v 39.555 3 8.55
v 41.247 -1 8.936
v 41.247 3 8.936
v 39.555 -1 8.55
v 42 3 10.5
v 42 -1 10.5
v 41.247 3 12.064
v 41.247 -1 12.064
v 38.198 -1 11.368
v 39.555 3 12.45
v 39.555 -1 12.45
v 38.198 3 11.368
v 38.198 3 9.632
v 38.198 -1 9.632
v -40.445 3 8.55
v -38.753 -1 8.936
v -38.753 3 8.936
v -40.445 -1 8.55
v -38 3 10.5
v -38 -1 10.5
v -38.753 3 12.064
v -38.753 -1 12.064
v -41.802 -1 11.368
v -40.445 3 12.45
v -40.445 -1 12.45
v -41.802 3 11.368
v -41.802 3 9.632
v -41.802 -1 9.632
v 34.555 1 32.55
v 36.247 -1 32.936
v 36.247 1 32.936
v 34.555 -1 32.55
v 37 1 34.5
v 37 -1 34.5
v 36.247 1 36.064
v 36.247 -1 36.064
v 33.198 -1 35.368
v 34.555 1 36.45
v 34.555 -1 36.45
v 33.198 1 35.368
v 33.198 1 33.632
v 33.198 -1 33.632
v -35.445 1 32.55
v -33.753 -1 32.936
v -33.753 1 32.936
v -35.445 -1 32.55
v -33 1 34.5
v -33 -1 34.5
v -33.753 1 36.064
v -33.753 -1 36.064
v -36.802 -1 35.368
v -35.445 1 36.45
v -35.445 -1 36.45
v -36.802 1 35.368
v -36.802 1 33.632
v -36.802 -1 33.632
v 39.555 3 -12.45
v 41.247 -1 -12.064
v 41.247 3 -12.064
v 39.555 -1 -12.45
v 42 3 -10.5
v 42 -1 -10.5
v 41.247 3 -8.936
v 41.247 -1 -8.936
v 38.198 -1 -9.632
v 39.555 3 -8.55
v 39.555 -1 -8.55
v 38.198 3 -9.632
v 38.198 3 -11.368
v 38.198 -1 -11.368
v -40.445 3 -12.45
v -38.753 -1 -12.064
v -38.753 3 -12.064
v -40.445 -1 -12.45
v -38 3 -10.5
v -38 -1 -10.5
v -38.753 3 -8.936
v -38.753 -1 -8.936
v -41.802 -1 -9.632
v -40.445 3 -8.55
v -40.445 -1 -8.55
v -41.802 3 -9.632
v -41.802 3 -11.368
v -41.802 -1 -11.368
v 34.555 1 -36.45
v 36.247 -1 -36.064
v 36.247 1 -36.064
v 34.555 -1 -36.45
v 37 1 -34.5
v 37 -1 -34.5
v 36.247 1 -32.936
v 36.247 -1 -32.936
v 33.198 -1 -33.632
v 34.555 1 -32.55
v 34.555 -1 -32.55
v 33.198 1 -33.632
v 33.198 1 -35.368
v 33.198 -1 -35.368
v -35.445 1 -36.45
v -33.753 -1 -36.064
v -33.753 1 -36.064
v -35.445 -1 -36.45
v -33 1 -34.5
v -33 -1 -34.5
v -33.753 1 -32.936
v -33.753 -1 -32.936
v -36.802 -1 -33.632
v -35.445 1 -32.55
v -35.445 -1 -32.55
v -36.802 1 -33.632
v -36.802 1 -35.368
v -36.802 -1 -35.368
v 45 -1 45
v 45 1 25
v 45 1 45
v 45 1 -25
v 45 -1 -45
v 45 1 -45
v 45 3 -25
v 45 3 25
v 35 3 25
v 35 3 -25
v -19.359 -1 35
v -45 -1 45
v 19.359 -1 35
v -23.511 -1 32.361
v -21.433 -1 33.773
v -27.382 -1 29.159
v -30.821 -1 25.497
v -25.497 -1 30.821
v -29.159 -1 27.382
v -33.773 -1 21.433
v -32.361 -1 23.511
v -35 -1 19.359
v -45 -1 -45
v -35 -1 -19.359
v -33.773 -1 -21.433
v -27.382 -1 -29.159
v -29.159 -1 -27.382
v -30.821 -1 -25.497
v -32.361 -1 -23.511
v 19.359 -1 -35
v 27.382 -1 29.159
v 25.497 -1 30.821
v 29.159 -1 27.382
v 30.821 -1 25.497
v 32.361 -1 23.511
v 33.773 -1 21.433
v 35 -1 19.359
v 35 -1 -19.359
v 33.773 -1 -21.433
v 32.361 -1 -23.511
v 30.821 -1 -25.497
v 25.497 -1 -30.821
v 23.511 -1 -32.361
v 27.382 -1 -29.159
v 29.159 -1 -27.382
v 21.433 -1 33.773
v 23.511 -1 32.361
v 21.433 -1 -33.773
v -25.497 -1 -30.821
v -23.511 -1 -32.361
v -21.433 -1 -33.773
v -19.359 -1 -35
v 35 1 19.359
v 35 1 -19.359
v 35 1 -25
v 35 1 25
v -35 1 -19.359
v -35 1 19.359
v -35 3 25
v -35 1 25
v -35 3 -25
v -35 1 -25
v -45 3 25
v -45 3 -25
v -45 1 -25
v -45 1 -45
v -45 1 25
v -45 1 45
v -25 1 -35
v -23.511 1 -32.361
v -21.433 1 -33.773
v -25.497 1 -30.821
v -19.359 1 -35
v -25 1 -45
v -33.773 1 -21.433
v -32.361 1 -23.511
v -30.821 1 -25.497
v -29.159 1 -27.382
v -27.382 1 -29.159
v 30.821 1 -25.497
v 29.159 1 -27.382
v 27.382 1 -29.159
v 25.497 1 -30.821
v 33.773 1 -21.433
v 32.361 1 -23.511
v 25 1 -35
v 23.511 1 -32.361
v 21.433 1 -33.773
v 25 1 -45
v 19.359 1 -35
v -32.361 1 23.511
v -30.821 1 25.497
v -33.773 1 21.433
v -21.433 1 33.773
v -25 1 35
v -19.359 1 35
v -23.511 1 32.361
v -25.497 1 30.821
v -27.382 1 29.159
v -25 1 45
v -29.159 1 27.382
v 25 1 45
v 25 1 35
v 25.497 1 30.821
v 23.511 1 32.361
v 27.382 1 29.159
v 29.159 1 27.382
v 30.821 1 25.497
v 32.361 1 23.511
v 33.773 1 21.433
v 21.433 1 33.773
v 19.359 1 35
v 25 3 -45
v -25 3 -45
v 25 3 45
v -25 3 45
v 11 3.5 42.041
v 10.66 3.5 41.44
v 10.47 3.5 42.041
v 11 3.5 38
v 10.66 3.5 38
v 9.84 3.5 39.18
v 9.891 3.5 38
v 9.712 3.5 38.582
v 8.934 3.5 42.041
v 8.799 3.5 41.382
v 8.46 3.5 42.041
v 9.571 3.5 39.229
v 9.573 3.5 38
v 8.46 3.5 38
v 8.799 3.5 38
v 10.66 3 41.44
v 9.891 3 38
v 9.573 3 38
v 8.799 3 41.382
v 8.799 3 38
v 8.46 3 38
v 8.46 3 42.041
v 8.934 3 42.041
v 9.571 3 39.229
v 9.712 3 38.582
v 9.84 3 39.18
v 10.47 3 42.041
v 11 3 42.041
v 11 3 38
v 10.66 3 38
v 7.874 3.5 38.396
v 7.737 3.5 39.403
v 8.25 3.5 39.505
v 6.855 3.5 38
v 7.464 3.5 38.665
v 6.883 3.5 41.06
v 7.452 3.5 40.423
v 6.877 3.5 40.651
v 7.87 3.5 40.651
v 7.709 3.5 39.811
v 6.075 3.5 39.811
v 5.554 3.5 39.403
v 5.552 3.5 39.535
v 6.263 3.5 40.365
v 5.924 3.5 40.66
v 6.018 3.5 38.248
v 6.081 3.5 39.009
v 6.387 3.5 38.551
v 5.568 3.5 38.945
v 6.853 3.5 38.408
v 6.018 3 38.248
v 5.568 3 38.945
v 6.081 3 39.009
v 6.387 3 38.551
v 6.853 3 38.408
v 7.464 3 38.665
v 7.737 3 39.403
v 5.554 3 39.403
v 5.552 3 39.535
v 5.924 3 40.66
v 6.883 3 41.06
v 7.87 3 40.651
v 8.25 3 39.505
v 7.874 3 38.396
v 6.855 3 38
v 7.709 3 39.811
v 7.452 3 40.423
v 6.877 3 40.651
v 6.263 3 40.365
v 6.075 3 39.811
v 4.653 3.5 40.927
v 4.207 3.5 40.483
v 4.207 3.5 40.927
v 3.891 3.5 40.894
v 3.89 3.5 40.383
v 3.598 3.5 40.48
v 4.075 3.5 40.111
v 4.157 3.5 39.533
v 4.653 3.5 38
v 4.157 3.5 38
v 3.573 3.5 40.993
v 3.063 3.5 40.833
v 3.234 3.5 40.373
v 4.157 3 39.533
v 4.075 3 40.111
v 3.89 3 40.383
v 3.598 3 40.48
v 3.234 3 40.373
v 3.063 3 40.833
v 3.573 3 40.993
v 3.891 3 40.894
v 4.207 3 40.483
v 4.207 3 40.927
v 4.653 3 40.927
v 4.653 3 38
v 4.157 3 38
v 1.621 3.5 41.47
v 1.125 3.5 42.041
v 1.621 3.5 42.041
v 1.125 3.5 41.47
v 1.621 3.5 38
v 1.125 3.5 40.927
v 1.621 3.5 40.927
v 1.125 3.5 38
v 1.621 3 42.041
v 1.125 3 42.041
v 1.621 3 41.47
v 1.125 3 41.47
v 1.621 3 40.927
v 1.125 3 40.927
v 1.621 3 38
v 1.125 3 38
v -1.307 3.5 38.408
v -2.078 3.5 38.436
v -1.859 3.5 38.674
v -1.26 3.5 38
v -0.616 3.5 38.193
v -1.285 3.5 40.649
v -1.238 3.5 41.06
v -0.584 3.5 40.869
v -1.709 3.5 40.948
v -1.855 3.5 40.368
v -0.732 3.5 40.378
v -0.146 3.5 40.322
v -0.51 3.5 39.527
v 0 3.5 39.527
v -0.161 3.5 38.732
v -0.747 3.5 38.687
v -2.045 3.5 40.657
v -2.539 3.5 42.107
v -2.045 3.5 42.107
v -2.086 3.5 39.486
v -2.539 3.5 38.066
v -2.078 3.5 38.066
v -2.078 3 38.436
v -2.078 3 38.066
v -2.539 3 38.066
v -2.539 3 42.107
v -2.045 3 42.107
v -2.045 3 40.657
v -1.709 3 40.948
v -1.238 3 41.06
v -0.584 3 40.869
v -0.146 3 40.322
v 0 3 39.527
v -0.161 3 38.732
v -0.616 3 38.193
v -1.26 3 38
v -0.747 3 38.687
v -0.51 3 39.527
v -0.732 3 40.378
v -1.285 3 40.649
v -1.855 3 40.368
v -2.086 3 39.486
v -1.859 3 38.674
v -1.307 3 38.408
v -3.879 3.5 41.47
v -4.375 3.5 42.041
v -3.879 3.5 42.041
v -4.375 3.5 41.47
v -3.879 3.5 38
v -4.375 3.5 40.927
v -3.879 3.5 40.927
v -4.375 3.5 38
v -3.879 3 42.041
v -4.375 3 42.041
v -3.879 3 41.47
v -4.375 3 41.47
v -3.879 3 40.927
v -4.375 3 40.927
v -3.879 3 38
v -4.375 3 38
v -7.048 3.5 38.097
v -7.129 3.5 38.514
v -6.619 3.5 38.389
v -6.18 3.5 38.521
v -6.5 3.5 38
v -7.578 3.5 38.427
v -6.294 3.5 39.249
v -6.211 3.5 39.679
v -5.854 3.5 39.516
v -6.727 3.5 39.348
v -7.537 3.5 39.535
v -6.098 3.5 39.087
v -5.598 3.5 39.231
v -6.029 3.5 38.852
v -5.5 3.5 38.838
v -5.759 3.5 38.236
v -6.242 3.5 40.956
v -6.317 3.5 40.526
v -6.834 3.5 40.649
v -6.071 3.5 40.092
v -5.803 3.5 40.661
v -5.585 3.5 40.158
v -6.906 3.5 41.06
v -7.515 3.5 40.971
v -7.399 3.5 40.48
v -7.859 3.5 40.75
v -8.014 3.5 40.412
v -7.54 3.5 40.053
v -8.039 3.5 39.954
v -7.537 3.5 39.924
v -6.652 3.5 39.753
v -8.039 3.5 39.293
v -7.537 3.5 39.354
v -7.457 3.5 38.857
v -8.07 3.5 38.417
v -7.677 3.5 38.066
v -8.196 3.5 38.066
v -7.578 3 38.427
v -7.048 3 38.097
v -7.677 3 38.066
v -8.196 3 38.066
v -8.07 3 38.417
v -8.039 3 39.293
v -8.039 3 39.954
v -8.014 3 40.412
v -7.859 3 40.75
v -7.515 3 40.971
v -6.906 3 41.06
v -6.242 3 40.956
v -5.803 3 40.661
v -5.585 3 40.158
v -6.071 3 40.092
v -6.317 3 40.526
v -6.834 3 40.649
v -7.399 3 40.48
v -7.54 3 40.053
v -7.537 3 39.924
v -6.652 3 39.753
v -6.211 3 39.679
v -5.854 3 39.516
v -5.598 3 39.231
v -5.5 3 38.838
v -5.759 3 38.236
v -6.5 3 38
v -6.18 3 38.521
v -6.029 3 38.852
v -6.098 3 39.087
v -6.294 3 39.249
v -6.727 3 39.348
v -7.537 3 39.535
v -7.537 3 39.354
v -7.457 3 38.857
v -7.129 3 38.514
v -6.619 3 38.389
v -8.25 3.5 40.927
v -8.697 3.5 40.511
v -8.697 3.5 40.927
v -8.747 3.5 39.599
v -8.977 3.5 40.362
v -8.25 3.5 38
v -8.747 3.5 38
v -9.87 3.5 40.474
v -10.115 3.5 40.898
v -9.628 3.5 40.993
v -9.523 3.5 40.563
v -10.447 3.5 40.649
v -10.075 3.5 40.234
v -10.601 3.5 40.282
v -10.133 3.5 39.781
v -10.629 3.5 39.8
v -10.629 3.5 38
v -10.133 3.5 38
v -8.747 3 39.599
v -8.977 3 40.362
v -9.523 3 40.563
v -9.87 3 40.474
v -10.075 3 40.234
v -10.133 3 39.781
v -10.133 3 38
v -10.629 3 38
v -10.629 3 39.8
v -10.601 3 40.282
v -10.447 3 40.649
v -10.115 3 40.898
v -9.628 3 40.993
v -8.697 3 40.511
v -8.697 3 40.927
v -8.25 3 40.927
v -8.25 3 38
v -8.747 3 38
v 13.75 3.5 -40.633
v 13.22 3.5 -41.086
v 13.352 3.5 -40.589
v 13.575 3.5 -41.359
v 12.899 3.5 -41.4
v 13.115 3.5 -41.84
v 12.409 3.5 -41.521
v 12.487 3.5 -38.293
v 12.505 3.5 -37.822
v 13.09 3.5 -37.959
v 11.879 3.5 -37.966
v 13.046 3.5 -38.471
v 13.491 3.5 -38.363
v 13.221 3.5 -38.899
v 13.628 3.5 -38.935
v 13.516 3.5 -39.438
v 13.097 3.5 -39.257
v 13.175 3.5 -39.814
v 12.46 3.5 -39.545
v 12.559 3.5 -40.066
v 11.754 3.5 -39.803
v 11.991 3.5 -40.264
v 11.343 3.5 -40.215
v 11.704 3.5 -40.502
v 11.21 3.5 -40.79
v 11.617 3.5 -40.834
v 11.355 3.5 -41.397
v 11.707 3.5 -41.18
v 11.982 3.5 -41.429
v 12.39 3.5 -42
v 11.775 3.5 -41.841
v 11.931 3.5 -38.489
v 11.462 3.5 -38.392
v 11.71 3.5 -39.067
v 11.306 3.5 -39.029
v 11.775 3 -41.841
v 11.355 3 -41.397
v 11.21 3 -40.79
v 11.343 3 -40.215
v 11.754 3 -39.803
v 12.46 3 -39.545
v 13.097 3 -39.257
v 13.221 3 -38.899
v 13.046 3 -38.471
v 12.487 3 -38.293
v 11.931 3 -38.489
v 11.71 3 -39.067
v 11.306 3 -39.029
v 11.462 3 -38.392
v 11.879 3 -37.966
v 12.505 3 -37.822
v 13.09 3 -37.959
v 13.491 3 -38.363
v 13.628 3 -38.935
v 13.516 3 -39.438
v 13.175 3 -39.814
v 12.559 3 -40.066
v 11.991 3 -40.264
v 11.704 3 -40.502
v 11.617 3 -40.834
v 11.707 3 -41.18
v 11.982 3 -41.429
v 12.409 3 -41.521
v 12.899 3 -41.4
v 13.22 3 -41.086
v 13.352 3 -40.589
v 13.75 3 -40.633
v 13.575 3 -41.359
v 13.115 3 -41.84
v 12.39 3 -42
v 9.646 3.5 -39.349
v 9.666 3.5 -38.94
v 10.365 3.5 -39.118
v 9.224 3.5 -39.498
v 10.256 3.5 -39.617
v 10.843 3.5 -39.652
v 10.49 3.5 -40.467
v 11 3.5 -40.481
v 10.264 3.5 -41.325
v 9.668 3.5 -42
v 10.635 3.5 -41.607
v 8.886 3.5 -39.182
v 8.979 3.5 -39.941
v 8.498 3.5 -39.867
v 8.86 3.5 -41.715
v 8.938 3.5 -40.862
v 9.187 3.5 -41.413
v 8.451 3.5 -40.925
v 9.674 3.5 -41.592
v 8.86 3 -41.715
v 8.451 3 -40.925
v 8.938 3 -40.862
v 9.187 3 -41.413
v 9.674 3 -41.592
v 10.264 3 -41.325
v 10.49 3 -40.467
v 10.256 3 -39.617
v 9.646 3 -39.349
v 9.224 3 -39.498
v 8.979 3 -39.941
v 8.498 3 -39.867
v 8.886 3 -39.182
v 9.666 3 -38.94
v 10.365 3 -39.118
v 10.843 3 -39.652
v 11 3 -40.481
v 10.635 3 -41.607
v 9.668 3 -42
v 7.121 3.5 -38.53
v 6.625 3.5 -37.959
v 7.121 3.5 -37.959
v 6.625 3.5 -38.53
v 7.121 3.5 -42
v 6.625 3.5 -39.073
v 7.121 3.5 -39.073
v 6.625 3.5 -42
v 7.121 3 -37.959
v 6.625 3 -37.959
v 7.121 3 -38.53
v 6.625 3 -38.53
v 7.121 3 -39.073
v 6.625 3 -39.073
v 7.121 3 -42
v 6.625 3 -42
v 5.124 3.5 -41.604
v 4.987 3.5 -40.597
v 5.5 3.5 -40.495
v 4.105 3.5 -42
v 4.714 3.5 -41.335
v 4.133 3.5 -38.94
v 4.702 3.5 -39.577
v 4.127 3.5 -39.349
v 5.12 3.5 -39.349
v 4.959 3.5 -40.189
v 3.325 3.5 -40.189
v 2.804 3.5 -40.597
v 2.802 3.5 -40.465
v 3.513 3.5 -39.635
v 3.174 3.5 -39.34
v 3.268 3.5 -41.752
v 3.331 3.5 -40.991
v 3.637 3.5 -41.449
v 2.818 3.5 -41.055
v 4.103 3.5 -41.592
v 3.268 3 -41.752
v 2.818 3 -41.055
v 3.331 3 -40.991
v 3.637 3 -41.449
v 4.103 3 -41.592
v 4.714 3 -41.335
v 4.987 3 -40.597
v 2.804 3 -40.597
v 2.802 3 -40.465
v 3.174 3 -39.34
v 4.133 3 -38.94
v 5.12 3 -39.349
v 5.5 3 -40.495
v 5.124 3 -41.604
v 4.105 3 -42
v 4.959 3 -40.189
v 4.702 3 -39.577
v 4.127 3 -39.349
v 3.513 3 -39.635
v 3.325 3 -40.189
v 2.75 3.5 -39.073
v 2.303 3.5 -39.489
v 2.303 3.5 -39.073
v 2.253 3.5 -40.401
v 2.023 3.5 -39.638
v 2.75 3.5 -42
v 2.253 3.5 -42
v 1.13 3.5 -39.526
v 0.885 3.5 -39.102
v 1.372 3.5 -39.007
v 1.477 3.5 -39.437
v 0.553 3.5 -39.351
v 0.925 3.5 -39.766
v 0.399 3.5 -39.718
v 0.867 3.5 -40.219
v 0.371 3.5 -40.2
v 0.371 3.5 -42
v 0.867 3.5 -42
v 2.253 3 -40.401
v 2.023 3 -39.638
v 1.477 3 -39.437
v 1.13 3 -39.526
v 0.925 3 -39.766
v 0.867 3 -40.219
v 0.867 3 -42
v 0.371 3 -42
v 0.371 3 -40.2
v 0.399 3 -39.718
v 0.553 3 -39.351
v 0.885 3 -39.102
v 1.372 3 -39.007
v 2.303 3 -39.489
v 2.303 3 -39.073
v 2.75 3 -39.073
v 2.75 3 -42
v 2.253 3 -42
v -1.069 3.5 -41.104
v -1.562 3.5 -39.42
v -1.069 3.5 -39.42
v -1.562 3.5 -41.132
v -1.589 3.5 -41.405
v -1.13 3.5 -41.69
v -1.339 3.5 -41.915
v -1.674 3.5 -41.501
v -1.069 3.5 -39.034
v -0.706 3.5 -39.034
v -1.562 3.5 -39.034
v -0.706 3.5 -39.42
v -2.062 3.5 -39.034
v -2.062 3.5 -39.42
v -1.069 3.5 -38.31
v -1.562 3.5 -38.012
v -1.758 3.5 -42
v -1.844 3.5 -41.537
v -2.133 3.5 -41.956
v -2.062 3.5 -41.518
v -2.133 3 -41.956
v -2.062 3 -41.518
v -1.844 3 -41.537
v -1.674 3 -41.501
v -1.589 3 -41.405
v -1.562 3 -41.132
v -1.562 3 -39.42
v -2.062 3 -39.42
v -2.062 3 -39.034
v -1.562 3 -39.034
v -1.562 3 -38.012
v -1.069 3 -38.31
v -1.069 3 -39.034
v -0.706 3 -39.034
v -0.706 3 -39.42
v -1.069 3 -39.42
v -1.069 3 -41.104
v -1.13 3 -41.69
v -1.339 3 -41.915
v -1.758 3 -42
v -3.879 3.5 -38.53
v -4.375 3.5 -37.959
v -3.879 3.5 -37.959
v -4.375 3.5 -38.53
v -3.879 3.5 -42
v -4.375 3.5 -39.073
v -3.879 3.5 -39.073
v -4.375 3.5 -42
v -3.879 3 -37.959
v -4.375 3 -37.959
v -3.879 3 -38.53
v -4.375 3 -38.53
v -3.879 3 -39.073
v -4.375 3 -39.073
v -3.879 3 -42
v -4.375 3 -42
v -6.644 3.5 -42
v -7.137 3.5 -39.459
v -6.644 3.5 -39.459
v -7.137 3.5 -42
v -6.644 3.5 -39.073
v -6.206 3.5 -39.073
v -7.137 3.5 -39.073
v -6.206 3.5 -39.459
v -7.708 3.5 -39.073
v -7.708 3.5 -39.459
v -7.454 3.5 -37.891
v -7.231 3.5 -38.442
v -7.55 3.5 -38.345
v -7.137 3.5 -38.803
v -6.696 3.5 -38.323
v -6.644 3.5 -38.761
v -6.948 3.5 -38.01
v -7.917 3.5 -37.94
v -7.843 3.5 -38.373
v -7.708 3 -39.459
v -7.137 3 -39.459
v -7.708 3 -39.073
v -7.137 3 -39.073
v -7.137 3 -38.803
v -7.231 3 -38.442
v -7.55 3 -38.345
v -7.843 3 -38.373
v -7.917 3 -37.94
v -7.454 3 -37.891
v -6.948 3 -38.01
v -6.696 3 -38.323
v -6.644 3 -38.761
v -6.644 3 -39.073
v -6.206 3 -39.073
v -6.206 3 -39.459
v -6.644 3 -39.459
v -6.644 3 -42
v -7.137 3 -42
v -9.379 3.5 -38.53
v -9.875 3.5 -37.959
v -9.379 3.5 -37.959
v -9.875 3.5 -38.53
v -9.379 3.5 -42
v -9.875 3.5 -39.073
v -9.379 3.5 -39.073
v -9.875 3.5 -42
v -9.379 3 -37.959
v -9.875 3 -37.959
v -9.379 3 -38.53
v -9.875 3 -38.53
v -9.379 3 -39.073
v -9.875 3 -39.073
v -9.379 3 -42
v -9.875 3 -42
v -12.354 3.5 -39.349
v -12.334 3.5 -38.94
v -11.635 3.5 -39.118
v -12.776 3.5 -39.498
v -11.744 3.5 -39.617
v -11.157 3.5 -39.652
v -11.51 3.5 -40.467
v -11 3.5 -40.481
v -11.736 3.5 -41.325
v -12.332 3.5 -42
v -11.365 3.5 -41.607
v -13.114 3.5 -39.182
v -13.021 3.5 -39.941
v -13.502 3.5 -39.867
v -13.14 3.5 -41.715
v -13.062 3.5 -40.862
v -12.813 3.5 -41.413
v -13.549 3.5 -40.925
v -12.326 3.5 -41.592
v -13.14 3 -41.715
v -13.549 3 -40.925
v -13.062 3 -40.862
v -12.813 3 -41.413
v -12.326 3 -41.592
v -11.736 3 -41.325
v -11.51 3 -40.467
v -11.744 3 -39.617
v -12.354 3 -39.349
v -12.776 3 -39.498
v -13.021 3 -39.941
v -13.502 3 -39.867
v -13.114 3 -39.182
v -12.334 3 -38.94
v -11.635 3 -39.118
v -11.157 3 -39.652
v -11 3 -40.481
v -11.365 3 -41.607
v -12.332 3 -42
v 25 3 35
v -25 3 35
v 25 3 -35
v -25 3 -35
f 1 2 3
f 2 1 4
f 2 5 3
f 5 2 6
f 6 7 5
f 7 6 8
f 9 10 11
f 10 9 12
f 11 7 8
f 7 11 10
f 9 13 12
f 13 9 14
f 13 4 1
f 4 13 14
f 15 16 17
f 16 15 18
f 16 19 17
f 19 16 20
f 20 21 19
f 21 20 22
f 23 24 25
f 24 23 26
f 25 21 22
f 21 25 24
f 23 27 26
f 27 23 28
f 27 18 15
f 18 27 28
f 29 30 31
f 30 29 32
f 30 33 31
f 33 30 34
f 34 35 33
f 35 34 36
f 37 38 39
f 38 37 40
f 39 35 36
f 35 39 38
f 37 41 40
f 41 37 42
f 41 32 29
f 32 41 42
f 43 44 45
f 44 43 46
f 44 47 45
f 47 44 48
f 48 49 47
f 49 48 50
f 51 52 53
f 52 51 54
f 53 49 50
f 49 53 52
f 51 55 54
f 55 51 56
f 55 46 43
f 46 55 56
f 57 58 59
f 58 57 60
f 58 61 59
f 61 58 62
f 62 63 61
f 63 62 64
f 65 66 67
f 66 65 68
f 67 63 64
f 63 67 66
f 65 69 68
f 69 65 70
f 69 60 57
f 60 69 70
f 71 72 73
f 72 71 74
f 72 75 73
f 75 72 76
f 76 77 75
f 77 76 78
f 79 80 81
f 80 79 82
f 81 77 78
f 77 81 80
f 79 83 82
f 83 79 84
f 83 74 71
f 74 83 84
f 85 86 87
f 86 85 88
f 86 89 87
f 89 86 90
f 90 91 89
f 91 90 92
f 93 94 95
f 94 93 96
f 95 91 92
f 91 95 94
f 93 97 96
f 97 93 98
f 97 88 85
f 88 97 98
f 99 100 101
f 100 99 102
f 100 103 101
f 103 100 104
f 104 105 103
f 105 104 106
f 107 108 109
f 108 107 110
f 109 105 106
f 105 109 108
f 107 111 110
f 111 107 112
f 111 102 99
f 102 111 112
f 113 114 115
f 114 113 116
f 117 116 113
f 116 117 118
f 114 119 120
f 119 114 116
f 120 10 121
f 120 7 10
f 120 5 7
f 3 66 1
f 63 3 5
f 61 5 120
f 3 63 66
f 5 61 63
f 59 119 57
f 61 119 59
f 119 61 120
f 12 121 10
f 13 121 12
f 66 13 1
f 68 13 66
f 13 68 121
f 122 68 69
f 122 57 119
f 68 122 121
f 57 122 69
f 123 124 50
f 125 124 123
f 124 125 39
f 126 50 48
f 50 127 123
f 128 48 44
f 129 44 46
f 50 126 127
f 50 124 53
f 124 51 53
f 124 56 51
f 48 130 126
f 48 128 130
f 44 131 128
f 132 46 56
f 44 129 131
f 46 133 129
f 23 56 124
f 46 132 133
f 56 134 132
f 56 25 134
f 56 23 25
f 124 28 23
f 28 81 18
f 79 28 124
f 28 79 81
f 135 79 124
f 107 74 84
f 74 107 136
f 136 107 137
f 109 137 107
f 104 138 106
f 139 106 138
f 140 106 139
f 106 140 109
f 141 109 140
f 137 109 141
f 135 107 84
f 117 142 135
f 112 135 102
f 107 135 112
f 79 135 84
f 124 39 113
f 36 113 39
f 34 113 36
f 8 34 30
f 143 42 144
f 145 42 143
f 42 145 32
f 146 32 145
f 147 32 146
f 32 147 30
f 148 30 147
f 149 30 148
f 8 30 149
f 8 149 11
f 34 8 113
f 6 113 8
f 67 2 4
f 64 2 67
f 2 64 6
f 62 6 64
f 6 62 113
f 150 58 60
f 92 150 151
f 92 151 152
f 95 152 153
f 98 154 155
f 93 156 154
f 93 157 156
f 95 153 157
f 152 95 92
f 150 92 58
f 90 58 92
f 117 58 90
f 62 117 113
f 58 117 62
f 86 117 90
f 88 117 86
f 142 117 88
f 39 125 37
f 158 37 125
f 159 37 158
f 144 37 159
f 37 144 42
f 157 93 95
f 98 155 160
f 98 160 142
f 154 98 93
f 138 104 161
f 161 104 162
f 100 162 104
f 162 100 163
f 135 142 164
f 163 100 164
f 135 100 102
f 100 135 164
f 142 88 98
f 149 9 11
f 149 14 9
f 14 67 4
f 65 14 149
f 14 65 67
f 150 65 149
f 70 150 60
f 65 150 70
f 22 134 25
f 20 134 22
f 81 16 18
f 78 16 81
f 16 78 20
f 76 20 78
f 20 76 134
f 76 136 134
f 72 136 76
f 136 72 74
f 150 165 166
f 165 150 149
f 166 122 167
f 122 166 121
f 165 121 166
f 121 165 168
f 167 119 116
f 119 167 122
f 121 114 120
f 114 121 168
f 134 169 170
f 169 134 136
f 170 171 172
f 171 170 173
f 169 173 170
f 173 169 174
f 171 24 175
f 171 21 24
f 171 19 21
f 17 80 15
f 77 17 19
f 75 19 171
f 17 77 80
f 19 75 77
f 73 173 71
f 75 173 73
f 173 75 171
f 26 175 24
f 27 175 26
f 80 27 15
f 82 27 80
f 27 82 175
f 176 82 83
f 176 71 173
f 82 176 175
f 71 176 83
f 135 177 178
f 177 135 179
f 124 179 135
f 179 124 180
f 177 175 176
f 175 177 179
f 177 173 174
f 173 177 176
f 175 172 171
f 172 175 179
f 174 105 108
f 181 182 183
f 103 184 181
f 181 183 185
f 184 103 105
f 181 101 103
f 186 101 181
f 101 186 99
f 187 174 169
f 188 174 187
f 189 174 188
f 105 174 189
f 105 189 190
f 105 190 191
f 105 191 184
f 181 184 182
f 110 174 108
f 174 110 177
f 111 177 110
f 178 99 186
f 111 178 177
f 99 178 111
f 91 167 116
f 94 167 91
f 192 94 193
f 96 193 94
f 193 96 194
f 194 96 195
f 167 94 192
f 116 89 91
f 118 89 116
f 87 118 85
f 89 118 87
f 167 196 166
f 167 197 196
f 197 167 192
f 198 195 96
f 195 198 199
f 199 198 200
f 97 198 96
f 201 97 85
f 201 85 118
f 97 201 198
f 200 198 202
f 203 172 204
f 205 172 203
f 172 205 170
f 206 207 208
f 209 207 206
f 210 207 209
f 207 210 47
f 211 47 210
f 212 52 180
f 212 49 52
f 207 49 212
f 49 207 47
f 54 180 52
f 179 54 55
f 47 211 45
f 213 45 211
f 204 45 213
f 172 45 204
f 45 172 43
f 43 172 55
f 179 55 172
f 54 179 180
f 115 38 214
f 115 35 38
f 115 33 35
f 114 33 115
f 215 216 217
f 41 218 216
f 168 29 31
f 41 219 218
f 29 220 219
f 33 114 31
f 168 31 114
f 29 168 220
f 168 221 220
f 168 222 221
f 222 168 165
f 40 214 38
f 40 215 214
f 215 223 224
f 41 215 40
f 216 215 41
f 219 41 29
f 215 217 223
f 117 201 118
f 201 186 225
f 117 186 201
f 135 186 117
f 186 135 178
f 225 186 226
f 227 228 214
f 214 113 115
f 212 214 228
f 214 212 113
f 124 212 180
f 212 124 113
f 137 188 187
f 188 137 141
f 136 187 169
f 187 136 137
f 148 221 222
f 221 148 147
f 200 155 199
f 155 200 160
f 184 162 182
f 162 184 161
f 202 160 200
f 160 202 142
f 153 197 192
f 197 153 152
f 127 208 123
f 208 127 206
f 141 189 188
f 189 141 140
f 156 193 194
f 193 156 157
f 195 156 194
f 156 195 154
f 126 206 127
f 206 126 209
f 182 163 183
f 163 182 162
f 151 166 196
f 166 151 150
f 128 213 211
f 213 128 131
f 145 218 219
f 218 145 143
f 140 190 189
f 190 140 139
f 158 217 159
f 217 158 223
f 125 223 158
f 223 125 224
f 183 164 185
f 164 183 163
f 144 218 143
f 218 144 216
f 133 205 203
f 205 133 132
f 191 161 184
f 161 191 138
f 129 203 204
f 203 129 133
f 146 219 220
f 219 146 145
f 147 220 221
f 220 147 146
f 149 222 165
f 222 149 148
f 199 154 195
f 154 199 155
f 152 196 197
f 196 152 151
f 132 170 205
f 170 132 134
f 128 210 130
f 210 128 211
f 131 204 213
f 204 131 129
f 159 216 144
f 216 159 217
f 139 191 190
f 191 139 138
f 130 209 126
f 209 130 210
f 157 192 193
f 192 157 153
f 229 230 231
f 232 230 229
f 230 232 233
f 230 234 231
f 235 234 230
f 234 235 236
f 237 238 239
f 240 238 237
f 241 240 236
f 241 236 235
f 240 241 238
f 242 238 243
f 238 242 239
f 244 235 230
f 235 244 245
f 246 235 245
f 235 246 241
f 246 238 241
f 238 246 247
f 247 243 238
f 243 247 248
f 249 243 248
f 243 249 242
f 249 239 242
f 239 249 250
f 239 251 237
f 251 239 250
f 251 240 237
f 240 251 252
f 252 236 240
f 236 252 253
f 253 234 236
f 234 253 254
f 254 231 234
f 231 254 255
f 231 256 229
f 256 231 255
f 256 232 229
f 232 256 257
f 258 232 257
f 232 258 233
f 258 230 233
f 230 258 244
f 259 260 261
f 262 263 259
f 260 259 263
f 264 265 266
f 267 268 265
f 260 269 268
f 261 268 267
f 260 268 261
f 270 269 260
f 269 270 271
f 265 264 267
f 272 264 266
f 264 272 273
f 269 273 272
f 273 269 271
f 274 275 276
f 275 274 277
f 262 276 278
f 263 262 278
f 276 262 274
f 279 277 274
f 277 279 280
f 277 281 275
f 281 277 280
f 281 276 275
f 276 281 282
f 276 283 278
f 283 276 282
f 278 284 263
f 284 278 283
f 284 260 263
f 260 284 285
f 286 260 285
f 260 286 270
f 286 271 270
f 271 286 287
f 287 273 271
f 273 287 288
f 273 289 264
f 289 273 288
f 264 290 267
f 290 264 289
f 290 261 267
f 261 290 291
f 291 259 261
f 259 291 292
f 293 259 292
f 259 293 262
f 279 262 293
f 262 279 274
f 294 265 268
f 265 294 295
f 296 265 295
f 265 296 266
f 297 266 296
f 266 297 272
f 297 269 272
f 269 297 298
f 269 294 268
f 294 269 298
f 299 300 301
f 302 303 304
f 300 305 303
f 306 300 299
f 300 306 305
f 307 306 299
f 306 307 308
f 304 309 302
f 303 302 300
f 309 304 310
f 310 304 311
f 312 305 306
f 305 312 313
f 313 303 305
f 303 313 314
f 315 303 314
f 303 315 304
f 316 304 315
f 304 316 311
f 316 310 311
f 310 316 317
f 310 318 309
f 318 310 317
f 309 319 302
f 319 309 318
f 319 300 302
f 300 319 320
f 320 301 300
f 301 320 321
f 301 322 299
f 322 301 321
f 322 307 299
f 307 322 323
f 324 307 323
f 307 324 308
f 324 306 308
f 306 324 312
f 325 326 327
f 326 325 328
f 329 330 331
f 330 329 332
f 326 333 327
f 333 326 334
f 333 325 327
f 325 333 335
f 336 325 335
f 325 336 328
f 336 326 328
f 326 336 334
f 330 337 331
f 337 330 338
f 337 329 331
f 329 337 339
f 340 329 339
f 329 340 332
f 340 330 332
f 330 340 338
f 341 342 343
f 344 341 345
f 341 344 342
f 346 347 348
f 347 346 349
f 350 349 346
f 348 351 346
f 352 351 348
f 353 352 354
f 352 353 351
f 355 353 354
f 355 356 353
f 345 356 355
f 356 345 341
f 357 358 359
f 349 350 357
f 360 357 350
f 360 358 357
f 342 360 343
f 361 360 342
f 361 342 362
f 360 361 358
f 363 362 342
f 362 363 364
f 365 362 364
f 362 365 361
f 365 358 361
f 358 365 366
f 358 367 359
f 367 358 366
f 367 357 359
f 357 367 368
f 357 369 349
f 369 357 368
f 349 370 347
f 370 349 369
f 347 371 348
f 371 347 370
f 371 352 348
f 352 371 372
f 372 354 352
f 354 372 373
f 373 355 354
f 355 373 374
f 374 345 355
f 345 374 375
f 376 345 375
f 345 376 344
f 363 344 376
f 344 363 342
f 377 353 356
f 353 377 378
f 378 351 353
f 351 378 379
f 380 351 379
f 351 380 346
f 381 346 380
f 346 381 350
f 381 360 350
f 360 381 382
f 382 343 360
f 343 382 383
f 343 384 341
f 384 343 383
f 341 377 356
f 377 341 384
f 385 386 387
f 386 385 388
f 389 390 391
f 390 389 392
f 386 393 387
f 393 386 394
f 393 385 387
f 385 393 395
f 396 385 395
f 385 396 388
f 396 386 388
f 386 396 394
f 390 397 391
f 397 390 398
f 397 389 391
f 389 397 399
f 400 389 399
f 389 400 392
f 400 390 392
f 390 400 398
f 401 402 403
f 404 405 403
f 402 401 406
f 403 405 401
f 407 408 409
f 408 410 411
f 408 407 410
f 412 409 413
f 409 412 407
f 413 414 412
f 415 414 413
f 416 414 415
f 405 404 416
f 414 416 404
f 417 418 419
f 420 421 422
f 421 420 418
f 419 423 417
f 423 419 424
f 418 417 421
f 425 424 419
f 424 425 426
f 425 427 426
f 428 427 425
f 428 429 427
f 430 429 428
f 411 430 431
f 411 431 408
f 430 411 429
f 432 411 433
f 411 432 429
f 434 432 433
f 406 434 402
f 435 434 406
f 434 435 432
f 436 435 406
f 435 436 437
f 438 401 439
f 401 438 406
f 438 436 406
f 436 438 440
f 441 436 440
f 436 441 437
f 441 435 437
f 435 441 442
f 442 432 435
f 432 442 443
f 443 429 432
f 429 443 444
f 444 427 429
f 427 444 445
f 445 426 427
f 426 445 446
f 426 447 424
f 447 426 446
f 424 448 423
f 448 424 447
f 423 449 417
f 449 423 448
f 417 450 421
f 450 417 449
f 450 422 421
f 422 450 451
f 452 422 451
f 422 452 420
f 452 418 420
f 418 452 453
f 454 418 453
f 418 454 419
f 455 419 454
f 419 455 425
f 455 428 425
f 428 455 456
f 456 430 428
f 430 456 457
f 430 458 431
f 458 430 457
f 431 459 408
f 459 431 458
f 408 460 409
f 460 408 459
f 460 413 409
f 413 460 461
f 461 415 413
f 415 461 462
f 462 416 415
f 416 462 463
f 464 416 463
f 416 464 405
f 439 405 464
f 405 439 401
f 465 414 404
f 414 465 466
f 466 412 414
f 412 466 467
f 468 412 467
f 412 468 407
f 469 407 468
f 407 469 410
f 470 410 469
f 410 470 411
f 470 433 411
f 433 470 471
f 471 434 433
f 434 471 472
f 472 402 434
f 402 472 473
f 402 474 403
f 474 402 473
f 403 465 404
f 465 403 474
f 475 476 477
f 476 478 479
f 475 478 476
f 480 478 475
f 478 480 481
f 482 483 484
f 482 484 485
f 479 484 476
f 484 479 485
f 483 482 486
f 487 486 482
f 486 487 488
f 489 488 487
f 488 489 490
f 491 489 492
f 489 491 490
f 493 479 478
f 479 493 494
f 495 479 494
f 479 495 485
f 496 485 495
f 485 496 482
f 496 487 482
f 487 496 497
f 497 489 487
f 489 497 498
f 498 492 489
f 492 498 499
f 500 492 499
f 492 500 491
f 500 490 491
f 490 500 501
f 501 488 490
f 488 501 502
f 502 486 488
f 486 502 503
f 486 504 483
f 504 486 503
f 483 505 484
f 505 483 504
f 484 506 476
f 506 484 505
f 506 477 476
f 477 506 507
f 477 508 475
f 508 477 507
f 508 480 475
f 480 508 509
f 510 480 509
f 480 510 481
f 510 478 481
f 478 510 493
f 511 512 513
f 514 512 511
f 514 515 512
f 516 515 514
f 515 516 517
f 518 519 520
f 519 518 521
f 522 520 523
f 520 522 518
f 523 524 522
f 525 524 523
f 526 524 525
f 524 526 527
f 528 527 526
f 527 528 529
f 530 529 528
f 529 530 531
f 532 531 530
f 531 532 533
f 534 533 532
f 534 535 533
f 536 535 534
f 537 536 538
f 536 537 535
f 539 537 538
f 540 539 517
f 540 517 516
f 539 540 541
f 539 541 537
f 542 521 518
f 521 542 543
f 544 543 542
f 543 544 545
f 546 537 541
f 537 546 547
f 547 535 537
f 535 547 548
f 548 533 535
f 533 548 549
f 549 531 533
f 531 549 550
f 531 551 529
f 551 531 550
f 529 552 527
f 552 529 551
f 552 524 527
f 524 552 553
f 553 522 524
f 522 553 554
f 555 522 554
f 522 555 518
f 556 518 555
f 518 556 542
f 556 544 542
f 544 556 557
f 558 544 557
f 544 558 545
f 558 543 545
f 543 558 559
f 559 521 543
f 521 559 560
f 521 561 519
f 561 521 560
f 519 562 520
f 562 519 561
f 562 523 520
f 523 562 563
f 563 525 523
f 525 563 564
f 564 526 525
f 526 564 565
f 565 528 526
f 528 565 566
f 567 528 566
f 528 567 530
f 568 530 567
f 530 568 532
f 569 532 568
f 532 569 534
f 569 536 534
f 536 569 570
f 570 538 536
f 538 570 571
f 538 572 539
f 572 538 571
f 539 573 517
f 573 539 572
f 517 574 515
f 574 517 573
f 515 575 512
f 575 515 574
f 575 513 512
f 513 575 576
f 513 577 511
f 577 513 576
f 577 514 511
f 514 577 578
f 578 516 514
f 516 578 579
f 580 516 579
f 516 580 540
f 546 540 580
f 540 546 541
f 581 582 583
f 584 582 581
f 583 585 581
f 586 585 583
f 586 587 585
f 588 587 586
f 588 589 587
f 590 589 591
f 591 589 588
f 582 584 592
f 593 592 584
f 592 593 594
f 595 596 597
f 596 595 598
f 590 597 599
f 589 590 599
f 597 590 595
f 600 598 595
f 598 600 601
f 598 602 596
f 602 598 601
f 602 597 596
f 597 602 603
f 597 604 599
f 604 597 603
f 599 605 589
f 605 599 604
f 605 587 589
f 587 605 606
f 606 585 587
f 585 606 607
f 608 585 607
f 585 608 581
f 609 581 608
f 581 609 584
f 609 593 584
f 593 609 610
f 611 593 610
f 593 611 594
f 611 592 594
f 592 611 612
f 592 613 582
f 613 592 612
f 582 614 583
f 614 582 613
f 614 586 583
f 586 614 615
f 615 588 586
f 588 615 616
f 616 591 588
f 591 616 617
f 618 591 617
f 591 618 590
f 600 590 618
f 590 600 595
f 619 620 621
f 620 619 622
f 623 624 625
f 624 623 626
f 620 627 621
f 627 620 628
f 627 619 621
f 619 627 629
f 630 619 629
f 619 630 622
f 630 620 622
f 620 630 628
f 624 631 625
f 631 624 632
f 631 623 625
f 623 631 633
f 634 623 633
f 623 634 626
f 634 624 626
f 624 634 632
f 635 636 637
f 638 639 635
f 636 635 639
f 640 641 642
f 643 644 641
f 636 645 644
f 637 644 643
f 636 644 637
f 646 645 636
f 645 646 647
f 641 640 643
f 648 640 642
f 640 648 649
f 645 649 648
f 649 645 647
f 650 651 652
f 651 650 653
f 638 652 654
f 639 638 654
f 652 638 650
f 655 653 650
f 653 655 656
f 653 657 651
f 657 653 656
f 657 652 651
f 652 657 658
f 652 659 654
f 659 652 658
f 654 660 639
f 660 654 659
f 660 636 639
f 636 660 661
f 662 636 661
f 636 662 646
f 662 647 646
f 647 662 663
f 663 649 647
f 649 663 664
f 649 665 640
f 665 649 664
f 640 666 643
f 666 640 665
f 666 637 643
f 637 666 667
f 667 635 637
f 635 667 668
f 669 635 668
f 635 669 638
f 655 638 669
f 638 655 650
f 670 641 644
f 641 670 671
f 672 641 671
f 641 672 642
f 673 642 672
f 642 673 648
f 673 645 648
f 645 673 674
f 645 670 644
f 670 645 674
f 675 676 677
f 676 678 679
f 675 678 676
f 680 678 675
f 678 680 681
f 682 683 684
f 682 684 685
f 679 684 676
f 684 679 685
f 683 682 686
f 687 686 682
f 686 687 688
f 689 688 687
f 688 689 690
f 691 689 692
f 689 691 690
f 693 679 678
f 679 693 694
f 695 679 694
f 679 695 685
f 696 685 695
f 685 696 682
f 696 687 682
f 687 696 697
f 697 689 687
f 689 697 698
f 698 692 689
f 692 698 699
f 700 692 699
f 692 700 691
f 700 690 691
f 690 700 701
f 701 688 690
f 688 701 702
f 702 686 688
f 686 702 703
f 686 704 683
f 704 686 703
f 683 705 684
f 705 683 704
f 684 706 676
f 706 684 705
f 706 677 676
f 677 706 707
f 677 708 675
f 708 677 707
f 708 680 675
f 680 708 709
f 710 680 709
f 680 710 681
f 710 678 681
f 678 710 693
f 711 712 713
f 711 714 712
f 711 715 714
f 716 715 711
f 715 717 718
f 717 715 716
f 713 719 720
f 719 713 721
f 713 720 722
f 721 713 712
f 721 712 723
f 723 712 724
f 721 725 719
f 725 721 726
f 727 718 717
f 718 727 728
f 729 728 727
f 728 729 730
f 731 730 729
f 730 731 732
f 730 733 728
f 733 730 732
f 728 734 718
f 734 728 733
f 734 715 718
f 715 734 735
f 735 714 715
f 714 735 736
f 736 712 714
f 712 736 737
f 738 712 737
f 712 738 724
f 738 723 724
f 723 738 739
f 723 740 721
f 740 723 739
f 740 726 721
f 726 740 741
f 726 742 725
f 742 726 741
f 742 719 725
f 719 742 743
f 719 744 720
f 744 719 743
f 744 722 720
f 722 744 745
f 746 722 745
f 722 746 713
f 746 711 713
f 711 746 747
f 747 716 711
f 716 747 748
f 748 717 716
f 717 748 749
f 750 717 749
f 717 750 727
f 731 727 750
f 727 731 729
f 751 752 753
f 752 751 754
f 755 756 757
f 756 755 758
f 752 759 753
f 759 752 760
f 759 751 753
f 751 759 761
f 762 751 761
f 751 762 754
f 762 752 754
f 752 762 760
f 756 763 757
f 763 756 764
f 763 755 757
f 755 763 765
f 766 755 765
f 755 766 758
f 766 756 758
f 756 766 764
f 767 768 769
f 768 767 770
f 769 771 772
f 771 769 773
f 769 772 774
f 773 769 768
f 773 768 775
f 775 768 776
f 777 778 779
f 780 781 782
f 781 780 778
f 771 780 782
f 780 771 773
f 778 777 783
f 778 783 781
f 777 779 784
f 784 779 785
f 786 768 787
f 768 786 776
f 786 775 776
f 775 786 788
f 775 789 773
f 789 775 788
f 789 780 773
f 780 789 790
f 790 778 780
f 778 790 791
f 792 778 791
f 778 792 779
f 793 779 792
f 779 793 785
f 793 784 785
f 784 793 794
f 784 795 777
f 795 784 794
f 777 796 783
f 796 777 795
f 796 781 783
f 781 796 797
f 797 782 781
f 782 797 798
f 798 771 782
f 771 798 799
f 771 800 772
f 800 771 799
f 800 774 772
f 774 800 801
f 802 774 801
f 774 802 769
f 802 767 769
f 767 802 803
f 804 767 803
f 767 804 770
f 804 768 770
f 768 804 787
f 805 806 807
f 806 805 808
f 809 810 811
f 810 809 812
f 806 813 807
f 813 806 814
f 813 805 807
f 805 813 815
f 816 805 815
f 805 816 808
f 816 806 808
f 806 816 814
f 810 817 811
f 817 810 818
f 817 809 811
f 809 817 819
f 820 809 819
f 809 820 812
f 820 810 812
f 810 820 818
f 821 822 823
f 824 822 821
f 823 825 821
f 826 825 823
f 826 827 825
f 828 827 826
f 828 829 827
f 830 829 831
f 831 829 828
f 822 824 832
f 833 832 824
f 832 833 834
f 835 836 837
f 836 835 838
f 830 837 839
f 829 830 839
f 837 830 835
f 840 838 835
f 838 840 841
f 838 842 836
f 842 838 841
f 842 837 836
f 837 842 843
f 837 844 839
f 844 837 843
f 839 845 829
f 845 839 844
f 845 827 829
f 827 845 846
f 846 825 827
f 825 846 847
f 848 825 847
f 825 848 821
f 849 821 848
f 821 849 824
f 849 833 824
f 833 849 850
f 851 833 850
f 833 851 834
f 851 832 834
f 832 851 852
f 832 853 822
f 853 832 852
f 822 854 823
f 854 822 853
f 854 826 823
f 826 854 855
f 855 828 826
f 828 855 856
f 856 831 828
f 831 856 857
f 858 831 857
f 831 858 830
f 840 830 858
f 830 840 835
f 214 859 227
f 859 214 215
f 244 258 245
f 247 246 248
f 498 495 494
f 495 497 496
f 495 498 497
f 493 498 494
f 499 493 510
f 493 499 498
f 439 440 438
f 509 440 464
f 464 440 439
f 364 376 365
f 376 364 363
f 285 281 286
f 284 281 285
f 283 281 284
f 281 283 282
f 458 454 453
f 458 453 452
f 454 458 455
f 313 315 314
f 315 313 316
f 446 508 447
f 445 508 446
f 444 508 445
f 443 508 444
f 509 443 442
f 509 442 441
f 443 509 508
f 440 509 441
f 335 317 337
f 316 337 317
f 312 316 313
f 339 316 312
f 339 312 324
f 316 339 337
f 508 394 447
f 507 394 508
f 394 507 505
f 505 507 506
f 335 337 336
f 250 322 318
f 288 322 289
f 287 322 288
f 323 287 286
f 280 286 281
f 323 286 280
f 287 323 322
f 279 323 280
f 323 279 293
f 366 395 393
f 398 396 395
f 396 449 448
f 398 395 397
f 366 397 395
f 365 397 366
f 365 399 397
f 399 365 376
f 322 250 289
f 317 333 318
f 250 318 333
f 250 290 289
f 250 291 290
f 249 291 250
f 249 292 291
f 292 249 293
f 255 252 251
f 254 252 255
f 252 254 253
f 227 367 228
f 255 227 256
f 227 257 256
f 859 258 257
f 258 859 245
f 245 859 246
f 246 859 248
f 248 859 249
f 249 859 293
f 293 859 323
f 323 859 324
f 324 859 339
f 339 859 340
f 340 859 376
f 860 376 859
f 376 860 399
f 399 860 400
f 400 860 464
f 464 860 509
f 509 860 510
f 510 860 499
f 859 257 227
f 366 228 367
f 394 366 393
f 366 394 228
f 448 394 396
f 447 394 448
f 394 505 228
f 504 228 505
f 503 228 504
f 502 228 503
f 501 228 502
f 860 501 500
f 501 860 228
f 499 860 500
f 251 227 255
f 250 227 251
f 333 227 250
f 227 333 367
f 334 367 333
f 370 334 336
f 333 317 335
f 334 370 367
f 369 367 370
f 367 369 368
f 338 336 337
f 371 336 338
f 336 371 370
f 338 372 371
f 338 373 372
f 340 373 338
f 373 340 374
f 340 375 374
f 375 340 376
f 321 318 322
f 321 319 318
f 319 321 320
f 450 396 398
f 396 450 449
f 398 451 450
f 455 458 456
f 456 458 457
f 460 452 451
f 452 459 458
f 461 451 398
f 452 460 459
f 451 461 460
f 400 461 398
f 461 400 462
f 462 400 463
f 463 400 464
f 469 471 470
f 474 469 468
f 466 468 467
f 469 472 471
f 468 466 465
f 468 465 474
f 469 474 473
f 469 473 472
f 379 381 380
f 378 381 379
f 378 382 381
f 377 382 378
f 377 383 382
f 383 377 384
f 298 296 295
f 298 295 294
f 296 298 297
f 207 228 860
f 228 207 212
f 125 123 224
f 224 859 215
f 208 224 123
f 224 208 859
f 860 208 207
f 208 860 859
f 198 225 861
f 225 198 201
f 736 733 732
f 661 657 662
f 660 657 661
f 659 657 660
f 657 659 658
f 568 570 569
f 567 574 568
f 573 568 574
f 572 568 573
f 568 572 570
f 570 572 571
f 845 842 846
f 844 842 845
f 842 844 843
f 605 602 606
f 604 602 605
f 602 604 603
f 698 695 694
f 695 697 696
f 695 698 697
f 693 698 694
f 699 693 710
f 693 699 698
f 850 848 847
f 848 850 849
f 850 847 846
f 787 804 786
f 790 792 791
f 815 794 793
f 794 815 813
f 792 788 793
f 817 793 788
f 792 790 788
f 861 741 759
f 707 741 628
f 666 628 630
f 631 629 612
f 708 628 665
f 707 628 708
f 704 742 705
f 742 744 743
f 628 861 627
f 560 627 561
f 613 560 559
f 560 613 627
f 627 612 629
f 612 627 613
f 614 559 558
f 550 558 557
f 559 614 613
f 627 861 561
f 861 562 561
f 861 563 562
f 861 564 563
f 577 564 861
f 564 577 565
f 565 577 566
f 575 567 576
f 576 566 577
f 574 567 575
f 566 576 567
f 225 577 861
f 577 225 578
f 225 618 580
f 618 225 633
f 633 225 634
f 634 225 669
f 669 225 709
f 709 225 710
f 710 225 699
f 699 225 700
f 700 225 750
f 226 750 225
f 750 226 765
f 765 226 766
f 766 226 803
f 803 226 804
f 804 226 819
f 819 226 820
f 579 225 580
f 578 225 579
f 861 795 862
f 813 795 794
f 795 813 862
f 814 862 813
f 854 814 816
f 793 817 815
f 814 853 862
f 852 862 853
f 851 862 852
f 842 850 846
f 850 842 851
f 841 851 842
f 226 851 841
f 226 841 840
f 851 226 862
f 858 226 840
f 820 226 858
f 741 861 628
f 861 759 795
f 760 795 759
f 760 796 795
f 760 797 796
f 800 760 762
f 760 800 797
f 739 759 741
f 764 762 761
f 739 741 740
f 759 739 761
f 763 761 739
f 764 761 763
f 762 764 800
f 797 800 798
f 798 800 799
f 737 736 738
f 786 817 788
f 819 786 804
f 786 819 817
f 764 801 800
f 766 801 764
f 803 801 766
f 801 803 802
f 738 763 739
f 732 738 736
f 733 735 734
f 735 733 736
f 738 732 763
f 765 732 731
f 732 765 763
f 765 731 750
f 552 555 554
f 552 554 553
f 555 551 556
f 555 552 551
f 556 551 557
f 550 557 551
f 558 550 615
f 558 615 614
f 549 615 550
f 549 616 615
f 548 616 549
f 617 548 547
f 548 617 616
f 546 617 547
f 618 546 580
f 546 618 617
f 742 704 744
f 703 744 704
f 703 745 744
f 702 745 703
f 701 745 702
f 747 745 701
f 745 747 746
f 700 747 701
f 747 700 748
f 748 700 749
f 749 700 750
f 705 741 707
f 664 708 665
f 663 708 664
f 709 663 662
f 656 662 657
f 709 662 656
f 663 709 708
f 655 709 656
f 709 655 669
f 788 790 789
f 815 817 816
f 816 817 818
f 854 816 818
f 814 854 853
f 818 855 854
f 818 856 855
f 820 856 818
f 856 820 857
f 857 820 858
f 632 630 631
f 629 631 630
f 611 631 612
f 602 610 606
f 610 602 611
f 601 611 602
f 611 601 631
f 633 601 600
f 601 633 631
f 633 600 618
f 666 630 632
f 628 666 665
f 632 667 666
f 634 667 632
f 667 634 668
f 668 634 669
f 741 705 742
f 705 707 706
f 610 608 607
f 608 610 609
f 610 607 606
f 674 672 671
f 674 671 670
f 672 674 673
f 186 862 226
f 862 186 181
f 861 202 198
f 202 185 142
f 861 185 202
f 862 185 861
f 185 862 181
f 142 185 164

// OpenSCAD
// file: filterMount_screwHoles.scad
module upperScrewHoles(){
	//upperMiddleHalf
	translate([40,12,0]) cylinder(h=30,r=2,center=true);
	translate([-40,12,0]) cylinder(h=30,r=2,center=true);
	//upperHalf
	translate([35,-12,0]) cylinder(h=30,r=2,center=true);
	translate([-35,-12,0]) cylinder(h=30,r=2,center=true);
}

module lowerScrewHoles(){
	//lowerMiddleHalf
	translate([40,-12,0]) cylinder(h=30,r=2,center=true);
	translate([-40,-12,0]) cylinder(h=30,r=2,center=true);
	//bottomwHalf
	translate([35,12,0]) cylinder(h=30,r=2,center=true);
	translate([-35,12,0]) cylinder(h=30,r=2,center=true);
}

upperScrewHoles();
lowerScrewHoles();
// main file
use <write.scad>
use <filterMount_screwHoles.scad>

module filterMountRetainingBracket(){
	//leftBlock
	difference(){
		translate([40,0,1]){
			color([.7,.9,.1]) cube(size=[10,50,4],center=true);
		}
		//screwHoles
		translate([0,-22.5,0]){
			upperScrewHoles();
		}
		translate([0,22.5,0]){
			lowerScrewHoles();
		}
	}
	//rightBlock
	difference(){
		translate([-40,0,1]){
			color([.7,.9,.1]) cube(size=[10,50,4],center=true);
		}
		//screwHoles
		translate([0,-22.5,0]){
			upperScrewHoles();
		}
		translate([0,22.5,0]){
			lowerScrewHoles();
		}
	}
	//upperBlock
	translate([0,-40,1]){
		color([.7,.9,.1]) cube(size=[50,10,4],center=true);
	}
	//lowerBlock
	translate([0,40,1]){
		color([.7,.9,.1]) cube(size=[50,10,4],center=true);
	}
	//frame
	difference(){
		//mountBody
		color([.7,.9,.1]) cube(size=[90,90,2],center=true);
		//filterHole
		translate([0,0,0]) cylinder(h=7,r=40,$fn=100,center=true);
		//screwHoles
		translate([0,-22.5,0]){
			upperScrewHoles();
		}
		translate([0,22.5,0]){
			lowerScrewHoles();
		}
	}
	rotate(180,0,0){
		translate([0,40,2]){
			write("Meridian",h=4,t=3,center=true);
		}
		translate([0,-40,2]){
			write("Scientific",h=4,t=3,center=true);
		}
	}
}

//filterMountRetainingBracket
rotate([-90,0,0]) translate([0,0,0]){
	filterMountRetainingBracket();
}
